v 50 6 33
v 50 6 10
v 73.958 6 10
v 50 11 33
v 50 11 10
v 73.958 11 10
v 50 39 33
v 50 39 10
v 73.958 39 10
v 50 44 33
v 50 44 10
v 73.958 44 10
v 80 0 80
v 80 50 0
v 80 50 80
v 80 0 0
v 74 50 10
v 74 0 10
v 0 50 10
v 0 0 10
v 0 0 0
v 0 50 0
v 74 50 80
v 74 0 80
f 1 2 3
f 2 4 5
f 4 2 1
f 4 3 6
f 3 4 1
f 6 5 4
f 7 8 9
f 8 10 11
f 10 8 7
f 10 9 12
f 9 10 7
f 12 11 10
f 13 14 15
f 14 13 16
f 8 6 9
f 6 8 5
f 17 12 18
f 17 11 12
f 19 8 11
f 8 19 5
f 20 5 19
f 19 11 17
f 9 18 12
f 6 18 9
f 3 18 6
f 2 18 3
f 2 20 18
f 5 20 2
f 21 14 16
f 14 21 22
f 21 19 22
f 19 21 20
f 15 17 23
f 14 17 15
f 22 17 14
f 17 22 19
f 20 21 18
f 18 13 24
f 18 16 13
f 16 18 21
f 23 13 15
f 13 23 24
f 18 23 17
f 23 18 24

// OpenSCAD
$fn = 32;

// ----------------------------------------------------------------------
// Rib bracket: 2-gusset L bracket
// ----------------------------------------------------------------------

// --- parameters (mm) ---
base_l = 80;              // foot length, X
base_w = 50;              // foot width, Y
base_t = 10;              // foot thickness
plate_t = 6;              // upright plate thickness
plate_h = 80;             // overall height
gus_l = 24;               // gusset leg along the foot
gus_h = 24;               // gusset height
gus_t = 5;                // gusset thickness
gus_edge = 6;             // gusset margin from the foot edge
n_gus = 2;                // gusset count

gus_pitch = (base_w - 2 * gus_edge - gus_t) / (n_gus - 1);  // gusset pitch

union() {
  cube([base_l, base_w, base_t]);
  translate([base_l - plate_t, 0, base_t - 1])
    cube([plate_t, base_w, plate_h - base_t + 1]);
  for (i = [0 : n_gus - 1])
    translate([base_l - plate_t - gus_l, gus_edge + i * gus_pitch, base_t - 1])
      rotate([-90, 0, 0])
        linear_extrude(height = gus_t)
          polygon(points = [[0, 0], [gus_l + 1, 0], [0, -gus_h]]);
}
